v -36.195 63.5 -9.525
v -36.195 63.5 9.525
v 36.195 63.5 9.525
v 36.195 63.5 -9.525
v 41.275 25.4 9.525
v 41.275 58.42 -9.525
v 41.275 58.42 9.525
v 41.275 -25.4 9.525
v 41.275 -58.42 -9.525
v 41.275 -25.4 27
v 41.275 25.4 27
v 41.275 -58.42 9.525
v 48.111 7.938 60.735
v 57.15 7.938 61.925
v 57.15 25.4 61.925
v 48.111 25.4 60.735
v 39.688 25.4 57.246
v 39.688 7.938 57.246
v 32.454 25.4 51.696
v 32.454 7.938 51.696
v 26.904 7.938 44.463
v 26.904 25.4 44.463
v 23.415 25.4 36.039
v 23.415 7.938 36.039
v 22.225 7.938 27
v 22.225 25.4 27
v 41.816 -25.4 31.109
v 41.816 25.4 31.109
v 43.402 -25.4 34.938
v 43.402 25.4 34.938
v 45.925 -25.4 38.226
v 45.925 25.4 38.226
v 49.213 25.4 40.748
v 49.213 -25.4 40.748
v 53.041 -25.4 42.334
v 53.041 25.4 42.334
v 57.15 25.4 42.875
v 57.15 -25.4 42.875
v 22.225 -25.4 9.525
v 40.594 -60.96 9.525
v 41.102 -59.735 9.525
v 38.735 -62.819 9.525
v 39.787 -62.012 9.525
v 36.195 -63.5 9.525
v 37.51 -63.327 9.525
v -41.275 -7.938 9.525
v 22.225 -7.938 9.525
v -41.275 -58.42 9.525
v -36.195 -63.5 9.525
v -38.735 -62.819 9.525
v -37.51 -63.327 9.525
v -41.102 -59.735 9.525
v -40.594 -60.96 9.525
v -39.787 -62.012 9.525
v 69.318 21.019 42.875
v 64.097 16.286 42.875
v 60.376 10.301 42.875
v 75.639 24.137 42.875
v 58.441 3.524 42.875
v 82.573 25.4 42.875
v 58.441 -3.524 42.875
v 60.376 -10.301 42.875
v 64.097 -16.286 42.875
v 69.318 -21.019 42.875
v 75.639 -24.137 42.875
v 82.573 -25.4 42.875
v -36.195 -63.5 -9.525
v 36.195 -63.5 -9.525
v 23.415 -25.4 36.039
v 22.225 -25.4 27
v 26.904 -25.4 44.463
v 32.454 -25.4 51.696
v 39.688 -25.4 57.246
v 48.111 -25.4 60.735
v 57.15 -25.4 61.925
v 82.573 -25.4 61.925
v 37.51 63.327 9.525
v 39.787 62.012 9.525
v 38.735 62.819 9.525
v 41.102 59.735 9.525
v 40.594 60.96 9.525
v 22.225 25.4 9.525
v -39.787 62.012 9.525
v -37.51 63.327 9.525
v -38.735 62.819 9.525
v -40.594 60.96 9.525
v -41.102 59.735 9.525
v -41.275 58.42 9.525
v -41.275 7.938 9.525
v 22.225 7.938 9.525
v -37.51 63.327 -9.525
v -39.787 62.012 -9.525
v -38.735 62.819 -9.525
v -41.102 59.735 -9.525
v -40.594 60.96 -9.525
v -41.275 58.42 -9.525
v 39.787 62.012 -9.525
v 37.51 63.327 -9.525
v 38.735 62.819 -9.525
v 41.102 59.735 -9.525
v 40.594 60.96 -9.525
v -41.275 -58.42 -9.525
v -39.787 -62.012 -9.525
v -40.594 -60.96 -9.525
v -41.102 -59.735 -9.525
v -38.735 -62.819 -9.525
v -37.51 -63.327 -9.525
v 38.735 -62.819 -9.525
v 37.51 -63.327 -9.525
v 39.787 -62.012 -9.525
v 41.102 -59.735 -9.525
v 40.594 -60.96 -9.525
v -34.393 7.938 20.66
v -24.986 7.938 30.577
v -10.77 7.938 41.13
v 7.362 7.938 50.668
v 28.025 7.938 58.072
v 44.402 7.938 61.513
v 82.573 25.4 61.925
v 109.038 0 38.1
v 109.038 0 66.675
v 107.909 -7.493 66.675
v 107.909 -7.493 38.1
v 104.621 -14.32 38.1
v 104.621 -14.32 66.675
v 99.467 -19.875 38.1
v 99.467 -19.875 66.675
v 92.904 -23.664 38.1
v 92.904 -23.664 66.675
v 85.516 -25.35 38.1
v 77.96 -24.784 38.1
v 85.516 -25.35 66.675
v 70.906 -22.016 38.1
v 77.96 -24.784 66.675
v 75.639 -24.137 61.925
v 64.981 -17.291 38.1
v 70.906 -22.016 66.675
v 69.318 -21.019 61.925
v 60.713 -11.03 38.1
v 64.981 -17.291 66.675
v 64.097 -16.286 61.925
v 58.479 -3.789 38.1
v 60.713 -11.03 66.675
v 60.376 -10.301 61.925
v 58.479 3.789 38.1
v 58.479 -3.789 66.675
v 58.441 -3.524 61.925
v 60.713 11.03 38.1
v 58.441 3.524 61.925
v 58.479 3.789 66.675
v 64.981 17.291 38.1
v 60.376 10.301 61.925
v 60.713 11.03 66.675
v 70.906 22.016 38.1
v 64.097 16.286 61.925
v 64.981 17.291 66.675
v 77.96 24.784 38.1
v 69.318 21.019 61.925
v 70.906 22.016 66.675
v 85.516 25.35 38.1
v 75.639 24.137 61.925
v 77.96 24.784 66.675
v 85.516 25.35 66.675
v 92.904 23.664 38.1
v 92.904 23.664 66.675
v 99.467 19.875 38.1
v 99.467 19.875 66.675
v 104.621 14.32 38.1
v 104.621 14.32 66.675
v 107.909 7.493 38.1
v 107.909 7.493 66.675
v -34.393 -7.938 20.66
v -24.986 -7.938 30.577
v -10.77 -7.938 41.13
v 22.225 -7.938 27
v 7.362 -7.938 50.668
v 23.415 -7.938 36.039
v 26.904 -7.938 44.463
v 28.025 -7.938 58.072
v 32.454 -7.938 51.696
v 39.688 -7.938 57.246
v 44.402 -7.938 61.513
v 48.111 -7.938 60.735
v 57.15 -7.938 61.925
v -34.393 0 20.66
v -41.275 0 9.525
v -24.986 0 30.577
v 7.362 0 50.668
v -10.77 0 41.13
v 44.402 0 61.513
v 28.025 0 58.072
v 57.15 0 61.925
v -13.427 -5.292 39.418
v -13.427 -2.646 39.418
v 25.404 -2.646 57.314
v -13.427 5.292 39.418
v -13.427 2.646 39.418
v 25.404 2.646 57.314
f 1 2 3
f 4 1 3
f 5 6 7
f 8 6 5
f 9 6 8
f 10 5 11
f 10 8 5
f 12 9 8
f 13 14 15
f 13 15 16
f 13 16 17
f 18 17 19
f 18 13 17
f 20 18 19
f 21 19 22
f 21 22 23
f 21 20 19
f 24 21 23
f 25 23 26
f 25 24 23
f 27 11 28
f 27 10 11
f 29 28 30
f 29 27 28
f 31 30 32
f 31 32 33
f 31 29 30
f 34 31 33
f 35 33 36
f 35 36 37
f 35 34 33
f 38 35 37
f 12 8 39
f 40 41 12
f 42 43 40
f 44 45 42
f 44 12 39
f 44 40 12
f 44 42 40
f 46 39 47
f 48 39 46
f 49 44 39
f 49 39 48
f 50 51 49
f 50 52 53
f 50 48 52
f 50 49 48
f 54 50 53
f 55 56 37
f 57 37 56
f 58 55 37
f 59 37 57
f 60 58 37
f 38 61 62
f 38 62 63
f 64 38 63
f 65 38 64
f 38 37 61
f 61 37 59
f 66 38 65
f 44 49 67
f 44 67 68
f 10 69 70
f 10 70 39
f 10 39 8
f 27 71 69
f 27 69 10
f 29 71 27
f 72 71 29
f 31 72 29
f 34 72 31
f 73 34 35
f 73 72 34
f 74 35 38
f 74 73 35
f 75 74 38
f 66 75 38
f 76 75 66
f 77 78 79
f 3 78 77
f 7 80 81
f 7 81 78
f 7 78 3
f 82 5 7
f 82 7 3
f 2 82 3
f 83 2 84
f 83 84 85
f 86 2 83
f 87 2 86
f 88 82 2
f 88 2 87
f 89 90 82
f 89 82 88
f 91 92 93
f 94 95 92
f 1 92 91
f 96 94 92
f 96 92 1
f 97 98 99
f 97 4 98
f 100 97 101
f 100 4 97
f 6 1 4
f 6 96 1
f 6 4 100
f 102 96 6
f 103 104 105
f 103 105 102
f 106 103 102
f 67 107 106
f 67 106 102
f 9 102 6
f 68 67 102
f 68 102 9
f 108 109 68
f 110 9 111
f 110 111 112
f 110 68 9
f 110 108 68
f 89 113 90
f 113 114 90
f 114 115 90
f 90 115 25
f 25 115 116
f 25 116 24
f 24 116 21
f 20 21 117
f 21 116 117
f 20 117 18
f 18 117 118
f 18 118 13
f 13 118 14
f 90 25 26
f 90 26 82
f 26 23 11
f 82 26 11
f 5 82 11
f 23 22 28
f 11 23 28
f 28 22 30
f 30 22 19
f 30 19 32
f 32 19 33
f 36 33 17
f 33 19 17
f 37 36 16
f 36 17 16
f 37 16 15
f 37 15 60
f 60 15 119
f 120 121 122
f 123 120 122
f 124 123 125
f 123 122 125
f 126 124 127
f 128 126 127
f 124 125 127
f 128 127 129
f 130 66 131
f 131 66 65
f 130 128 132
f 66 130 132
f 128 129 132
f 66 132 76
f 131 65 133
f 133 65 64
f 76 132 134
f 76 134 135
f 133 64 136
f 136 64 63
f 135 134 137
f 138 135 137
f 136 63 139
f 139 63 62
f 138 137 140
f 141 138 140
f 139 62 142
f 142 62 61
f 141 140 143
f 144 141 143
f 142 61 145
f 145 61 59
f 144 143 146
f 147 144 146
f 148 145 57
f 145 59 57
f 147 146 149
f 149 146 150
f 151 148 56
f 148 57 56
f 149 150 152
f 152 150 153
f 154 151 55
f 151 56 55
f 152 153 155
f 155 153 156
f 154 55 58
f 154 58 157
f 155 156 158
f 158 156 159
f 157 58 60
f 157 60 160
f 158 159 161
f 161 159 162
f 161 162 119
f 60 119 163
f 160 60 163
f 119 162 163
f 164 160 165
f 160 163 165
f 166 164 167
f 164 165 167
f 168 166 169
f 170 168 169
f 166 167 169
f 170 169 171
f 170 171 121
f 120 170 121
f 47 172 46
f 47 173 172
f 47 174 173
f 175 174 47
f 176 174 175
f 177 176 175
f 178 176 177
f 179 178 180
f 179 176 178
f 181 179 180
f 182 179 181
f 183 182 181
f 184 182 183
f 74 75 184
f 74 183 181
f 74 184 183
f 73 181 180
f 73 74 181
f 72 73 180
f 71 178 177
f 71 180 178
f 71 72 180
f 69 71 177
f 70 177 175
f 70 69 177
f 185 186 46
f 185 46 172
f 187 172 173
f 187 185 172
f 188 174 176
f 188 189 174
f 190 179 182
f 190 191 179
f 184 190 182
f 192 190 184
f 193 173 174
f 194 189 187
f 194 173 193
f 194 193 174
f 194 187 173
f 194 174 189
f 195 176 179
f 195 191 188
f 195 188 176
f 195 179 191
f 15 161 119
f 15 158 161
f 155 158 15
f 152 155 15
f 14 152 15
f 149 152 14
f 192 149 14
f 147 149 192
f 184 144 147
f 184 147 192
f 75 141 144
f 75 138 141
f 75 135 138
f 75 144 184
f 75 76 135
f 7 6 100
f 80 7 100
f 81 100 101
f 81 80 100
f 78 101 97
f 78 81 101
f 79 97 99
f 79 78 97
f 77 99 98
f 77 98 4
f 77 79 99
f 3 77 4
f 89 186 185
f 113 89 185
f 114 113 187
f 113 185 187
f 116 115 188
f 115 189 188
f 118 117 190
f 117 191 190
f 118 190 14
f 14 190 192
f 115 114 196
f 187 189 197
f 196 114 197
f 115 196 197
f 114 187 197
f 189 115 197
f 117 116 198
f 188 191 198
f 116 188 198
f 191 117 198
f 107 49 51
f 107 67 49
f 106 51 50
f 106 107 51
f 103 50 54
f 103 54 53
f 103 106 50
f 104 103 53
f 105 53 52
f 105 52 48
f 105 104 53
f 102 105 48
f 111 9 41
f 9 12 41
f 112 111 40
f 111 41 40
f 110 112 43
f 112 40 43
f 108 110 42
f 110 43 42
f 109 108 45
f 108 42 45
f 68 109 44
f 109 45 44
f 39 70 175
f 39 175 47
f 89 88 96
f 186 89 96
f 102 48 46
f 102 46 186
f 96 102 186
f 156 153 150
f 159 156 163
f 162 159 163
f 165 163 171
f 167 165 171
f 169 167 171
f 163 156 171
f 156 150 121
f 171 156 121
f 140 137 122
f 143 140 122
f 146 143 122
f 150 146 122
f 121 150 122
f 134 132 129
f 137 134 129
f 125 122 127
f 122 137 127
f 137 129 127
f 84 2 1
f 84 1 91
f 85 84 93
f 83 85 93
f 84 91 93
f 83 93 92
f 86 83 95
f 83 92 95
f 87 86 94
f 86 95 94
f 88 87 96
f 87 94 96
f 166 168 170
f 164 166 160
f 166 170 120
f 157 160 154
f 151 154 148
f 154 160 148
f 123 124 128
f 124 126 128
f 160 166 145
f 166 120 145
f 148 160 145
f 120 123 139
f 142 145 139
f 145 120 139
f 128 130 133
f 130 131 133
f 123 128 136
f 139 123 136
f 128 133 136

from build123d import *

# Parameters (mm, degrees)
F1_DEPTH = 63.5
F0_W     = 25.3785441501
F0_H     = 19.05
F2_DEPTH = 25.4
F3_DEPTH = 7.9375
F5_R     = 5.08


with BuildPart() as f1:
    # F0 (on Front) → F1 (new body, symmetric)
    with BuildSketch(Plane.XZ):
        Polygon((41.275, -9.525), (41.275, 9.525), (22.225, 9.525), (-41.275, 9.525), (-41.275, -9.525), align=None)
    extrude(amount=F1_DEPTH, both=True)

    # F0 (on Front) → F2 (join, symmetric)
    with BuildSketch(Plane.XZ):
        with Locations((70.927461476, 52.4002)):
            Rectangle(F0_W, F0_H)
        with BuildLine():
            Line((22.225, 9.525), (41.275, 9.525))
            Line((41.275, 9.525), (41.275, 27.0002))
            ThreePointArc((41.275, 27.0002), (45.9246798487, 38.2255201513), (57.15, 42.8752))
            Line((57.15, 42.8752), (58.2381894009, 42.8752))
            Line((58.2381894009, 42.8752), (58.2381894009, 61.9252))
            Line((58.2381894009, 61.9252), (57.15, 61.9252))
            ThreePointArc((57.15, 61.9252), (32.4542956671, 51.6959043329), (22.225, 27.0002))
            Line((22.225, 27.0002), (22.225, 9.525))
        make_face()
    extrude(amount=F2_DEPTH, both=True)

    # F0 (on Front) → F3 (join, symmetric)
    with BuildSketch(Plane.XZ):
        with BuildLine():
            Line((-41.275, 9.525), (22.225, 9.525))
            Line((22.225, 9.525), (22.225, 27.0002))
            ThreePointArc((22.225, 27.0002), (32.4542956671, 51.6959043329), (57.15, 61.9252))
            add(Edge.make_bspline(
                [(-41.275, 9.525), (-24.9403305352, 44.9881963432), (34.9694043398, 64.3845573068), (57.15, 61.9252)],
                knots=[0, 0, 0, 0, 111.5045361635, 111.5045361635, 111.5045361635, 111.5045361635], degree=3))
        make_face()
    extrude(amount=F3_DEPTH, both=True)

    # F0 (on Front) → F4 (revolve)
    with BuildSketch(Plane.XZ):
        Polygon((83.616733551, 61.9252), (83.616733551, 42.8752), (83.616733551, 38.1), (109.0381894009, 38.1), (109.0381894009, 66.675), (83.616733551, 66.675), align=None)
    revolve(axis=Axis((83.616733551, 0, 52.3875), (0, 0, -1)))

    # F5
    f5_edges = [f1.edges().sort_by_distance(p)[0] for p in [
        (-41.275, -63.5, 0),
        (-41.275, 63.5, 0),
        (41.275, 63.5, 0),
        (41.275, -63.5, 0),
    ]]
    fillet(f5_edges, radius=F5_R)


solid = f1.part
